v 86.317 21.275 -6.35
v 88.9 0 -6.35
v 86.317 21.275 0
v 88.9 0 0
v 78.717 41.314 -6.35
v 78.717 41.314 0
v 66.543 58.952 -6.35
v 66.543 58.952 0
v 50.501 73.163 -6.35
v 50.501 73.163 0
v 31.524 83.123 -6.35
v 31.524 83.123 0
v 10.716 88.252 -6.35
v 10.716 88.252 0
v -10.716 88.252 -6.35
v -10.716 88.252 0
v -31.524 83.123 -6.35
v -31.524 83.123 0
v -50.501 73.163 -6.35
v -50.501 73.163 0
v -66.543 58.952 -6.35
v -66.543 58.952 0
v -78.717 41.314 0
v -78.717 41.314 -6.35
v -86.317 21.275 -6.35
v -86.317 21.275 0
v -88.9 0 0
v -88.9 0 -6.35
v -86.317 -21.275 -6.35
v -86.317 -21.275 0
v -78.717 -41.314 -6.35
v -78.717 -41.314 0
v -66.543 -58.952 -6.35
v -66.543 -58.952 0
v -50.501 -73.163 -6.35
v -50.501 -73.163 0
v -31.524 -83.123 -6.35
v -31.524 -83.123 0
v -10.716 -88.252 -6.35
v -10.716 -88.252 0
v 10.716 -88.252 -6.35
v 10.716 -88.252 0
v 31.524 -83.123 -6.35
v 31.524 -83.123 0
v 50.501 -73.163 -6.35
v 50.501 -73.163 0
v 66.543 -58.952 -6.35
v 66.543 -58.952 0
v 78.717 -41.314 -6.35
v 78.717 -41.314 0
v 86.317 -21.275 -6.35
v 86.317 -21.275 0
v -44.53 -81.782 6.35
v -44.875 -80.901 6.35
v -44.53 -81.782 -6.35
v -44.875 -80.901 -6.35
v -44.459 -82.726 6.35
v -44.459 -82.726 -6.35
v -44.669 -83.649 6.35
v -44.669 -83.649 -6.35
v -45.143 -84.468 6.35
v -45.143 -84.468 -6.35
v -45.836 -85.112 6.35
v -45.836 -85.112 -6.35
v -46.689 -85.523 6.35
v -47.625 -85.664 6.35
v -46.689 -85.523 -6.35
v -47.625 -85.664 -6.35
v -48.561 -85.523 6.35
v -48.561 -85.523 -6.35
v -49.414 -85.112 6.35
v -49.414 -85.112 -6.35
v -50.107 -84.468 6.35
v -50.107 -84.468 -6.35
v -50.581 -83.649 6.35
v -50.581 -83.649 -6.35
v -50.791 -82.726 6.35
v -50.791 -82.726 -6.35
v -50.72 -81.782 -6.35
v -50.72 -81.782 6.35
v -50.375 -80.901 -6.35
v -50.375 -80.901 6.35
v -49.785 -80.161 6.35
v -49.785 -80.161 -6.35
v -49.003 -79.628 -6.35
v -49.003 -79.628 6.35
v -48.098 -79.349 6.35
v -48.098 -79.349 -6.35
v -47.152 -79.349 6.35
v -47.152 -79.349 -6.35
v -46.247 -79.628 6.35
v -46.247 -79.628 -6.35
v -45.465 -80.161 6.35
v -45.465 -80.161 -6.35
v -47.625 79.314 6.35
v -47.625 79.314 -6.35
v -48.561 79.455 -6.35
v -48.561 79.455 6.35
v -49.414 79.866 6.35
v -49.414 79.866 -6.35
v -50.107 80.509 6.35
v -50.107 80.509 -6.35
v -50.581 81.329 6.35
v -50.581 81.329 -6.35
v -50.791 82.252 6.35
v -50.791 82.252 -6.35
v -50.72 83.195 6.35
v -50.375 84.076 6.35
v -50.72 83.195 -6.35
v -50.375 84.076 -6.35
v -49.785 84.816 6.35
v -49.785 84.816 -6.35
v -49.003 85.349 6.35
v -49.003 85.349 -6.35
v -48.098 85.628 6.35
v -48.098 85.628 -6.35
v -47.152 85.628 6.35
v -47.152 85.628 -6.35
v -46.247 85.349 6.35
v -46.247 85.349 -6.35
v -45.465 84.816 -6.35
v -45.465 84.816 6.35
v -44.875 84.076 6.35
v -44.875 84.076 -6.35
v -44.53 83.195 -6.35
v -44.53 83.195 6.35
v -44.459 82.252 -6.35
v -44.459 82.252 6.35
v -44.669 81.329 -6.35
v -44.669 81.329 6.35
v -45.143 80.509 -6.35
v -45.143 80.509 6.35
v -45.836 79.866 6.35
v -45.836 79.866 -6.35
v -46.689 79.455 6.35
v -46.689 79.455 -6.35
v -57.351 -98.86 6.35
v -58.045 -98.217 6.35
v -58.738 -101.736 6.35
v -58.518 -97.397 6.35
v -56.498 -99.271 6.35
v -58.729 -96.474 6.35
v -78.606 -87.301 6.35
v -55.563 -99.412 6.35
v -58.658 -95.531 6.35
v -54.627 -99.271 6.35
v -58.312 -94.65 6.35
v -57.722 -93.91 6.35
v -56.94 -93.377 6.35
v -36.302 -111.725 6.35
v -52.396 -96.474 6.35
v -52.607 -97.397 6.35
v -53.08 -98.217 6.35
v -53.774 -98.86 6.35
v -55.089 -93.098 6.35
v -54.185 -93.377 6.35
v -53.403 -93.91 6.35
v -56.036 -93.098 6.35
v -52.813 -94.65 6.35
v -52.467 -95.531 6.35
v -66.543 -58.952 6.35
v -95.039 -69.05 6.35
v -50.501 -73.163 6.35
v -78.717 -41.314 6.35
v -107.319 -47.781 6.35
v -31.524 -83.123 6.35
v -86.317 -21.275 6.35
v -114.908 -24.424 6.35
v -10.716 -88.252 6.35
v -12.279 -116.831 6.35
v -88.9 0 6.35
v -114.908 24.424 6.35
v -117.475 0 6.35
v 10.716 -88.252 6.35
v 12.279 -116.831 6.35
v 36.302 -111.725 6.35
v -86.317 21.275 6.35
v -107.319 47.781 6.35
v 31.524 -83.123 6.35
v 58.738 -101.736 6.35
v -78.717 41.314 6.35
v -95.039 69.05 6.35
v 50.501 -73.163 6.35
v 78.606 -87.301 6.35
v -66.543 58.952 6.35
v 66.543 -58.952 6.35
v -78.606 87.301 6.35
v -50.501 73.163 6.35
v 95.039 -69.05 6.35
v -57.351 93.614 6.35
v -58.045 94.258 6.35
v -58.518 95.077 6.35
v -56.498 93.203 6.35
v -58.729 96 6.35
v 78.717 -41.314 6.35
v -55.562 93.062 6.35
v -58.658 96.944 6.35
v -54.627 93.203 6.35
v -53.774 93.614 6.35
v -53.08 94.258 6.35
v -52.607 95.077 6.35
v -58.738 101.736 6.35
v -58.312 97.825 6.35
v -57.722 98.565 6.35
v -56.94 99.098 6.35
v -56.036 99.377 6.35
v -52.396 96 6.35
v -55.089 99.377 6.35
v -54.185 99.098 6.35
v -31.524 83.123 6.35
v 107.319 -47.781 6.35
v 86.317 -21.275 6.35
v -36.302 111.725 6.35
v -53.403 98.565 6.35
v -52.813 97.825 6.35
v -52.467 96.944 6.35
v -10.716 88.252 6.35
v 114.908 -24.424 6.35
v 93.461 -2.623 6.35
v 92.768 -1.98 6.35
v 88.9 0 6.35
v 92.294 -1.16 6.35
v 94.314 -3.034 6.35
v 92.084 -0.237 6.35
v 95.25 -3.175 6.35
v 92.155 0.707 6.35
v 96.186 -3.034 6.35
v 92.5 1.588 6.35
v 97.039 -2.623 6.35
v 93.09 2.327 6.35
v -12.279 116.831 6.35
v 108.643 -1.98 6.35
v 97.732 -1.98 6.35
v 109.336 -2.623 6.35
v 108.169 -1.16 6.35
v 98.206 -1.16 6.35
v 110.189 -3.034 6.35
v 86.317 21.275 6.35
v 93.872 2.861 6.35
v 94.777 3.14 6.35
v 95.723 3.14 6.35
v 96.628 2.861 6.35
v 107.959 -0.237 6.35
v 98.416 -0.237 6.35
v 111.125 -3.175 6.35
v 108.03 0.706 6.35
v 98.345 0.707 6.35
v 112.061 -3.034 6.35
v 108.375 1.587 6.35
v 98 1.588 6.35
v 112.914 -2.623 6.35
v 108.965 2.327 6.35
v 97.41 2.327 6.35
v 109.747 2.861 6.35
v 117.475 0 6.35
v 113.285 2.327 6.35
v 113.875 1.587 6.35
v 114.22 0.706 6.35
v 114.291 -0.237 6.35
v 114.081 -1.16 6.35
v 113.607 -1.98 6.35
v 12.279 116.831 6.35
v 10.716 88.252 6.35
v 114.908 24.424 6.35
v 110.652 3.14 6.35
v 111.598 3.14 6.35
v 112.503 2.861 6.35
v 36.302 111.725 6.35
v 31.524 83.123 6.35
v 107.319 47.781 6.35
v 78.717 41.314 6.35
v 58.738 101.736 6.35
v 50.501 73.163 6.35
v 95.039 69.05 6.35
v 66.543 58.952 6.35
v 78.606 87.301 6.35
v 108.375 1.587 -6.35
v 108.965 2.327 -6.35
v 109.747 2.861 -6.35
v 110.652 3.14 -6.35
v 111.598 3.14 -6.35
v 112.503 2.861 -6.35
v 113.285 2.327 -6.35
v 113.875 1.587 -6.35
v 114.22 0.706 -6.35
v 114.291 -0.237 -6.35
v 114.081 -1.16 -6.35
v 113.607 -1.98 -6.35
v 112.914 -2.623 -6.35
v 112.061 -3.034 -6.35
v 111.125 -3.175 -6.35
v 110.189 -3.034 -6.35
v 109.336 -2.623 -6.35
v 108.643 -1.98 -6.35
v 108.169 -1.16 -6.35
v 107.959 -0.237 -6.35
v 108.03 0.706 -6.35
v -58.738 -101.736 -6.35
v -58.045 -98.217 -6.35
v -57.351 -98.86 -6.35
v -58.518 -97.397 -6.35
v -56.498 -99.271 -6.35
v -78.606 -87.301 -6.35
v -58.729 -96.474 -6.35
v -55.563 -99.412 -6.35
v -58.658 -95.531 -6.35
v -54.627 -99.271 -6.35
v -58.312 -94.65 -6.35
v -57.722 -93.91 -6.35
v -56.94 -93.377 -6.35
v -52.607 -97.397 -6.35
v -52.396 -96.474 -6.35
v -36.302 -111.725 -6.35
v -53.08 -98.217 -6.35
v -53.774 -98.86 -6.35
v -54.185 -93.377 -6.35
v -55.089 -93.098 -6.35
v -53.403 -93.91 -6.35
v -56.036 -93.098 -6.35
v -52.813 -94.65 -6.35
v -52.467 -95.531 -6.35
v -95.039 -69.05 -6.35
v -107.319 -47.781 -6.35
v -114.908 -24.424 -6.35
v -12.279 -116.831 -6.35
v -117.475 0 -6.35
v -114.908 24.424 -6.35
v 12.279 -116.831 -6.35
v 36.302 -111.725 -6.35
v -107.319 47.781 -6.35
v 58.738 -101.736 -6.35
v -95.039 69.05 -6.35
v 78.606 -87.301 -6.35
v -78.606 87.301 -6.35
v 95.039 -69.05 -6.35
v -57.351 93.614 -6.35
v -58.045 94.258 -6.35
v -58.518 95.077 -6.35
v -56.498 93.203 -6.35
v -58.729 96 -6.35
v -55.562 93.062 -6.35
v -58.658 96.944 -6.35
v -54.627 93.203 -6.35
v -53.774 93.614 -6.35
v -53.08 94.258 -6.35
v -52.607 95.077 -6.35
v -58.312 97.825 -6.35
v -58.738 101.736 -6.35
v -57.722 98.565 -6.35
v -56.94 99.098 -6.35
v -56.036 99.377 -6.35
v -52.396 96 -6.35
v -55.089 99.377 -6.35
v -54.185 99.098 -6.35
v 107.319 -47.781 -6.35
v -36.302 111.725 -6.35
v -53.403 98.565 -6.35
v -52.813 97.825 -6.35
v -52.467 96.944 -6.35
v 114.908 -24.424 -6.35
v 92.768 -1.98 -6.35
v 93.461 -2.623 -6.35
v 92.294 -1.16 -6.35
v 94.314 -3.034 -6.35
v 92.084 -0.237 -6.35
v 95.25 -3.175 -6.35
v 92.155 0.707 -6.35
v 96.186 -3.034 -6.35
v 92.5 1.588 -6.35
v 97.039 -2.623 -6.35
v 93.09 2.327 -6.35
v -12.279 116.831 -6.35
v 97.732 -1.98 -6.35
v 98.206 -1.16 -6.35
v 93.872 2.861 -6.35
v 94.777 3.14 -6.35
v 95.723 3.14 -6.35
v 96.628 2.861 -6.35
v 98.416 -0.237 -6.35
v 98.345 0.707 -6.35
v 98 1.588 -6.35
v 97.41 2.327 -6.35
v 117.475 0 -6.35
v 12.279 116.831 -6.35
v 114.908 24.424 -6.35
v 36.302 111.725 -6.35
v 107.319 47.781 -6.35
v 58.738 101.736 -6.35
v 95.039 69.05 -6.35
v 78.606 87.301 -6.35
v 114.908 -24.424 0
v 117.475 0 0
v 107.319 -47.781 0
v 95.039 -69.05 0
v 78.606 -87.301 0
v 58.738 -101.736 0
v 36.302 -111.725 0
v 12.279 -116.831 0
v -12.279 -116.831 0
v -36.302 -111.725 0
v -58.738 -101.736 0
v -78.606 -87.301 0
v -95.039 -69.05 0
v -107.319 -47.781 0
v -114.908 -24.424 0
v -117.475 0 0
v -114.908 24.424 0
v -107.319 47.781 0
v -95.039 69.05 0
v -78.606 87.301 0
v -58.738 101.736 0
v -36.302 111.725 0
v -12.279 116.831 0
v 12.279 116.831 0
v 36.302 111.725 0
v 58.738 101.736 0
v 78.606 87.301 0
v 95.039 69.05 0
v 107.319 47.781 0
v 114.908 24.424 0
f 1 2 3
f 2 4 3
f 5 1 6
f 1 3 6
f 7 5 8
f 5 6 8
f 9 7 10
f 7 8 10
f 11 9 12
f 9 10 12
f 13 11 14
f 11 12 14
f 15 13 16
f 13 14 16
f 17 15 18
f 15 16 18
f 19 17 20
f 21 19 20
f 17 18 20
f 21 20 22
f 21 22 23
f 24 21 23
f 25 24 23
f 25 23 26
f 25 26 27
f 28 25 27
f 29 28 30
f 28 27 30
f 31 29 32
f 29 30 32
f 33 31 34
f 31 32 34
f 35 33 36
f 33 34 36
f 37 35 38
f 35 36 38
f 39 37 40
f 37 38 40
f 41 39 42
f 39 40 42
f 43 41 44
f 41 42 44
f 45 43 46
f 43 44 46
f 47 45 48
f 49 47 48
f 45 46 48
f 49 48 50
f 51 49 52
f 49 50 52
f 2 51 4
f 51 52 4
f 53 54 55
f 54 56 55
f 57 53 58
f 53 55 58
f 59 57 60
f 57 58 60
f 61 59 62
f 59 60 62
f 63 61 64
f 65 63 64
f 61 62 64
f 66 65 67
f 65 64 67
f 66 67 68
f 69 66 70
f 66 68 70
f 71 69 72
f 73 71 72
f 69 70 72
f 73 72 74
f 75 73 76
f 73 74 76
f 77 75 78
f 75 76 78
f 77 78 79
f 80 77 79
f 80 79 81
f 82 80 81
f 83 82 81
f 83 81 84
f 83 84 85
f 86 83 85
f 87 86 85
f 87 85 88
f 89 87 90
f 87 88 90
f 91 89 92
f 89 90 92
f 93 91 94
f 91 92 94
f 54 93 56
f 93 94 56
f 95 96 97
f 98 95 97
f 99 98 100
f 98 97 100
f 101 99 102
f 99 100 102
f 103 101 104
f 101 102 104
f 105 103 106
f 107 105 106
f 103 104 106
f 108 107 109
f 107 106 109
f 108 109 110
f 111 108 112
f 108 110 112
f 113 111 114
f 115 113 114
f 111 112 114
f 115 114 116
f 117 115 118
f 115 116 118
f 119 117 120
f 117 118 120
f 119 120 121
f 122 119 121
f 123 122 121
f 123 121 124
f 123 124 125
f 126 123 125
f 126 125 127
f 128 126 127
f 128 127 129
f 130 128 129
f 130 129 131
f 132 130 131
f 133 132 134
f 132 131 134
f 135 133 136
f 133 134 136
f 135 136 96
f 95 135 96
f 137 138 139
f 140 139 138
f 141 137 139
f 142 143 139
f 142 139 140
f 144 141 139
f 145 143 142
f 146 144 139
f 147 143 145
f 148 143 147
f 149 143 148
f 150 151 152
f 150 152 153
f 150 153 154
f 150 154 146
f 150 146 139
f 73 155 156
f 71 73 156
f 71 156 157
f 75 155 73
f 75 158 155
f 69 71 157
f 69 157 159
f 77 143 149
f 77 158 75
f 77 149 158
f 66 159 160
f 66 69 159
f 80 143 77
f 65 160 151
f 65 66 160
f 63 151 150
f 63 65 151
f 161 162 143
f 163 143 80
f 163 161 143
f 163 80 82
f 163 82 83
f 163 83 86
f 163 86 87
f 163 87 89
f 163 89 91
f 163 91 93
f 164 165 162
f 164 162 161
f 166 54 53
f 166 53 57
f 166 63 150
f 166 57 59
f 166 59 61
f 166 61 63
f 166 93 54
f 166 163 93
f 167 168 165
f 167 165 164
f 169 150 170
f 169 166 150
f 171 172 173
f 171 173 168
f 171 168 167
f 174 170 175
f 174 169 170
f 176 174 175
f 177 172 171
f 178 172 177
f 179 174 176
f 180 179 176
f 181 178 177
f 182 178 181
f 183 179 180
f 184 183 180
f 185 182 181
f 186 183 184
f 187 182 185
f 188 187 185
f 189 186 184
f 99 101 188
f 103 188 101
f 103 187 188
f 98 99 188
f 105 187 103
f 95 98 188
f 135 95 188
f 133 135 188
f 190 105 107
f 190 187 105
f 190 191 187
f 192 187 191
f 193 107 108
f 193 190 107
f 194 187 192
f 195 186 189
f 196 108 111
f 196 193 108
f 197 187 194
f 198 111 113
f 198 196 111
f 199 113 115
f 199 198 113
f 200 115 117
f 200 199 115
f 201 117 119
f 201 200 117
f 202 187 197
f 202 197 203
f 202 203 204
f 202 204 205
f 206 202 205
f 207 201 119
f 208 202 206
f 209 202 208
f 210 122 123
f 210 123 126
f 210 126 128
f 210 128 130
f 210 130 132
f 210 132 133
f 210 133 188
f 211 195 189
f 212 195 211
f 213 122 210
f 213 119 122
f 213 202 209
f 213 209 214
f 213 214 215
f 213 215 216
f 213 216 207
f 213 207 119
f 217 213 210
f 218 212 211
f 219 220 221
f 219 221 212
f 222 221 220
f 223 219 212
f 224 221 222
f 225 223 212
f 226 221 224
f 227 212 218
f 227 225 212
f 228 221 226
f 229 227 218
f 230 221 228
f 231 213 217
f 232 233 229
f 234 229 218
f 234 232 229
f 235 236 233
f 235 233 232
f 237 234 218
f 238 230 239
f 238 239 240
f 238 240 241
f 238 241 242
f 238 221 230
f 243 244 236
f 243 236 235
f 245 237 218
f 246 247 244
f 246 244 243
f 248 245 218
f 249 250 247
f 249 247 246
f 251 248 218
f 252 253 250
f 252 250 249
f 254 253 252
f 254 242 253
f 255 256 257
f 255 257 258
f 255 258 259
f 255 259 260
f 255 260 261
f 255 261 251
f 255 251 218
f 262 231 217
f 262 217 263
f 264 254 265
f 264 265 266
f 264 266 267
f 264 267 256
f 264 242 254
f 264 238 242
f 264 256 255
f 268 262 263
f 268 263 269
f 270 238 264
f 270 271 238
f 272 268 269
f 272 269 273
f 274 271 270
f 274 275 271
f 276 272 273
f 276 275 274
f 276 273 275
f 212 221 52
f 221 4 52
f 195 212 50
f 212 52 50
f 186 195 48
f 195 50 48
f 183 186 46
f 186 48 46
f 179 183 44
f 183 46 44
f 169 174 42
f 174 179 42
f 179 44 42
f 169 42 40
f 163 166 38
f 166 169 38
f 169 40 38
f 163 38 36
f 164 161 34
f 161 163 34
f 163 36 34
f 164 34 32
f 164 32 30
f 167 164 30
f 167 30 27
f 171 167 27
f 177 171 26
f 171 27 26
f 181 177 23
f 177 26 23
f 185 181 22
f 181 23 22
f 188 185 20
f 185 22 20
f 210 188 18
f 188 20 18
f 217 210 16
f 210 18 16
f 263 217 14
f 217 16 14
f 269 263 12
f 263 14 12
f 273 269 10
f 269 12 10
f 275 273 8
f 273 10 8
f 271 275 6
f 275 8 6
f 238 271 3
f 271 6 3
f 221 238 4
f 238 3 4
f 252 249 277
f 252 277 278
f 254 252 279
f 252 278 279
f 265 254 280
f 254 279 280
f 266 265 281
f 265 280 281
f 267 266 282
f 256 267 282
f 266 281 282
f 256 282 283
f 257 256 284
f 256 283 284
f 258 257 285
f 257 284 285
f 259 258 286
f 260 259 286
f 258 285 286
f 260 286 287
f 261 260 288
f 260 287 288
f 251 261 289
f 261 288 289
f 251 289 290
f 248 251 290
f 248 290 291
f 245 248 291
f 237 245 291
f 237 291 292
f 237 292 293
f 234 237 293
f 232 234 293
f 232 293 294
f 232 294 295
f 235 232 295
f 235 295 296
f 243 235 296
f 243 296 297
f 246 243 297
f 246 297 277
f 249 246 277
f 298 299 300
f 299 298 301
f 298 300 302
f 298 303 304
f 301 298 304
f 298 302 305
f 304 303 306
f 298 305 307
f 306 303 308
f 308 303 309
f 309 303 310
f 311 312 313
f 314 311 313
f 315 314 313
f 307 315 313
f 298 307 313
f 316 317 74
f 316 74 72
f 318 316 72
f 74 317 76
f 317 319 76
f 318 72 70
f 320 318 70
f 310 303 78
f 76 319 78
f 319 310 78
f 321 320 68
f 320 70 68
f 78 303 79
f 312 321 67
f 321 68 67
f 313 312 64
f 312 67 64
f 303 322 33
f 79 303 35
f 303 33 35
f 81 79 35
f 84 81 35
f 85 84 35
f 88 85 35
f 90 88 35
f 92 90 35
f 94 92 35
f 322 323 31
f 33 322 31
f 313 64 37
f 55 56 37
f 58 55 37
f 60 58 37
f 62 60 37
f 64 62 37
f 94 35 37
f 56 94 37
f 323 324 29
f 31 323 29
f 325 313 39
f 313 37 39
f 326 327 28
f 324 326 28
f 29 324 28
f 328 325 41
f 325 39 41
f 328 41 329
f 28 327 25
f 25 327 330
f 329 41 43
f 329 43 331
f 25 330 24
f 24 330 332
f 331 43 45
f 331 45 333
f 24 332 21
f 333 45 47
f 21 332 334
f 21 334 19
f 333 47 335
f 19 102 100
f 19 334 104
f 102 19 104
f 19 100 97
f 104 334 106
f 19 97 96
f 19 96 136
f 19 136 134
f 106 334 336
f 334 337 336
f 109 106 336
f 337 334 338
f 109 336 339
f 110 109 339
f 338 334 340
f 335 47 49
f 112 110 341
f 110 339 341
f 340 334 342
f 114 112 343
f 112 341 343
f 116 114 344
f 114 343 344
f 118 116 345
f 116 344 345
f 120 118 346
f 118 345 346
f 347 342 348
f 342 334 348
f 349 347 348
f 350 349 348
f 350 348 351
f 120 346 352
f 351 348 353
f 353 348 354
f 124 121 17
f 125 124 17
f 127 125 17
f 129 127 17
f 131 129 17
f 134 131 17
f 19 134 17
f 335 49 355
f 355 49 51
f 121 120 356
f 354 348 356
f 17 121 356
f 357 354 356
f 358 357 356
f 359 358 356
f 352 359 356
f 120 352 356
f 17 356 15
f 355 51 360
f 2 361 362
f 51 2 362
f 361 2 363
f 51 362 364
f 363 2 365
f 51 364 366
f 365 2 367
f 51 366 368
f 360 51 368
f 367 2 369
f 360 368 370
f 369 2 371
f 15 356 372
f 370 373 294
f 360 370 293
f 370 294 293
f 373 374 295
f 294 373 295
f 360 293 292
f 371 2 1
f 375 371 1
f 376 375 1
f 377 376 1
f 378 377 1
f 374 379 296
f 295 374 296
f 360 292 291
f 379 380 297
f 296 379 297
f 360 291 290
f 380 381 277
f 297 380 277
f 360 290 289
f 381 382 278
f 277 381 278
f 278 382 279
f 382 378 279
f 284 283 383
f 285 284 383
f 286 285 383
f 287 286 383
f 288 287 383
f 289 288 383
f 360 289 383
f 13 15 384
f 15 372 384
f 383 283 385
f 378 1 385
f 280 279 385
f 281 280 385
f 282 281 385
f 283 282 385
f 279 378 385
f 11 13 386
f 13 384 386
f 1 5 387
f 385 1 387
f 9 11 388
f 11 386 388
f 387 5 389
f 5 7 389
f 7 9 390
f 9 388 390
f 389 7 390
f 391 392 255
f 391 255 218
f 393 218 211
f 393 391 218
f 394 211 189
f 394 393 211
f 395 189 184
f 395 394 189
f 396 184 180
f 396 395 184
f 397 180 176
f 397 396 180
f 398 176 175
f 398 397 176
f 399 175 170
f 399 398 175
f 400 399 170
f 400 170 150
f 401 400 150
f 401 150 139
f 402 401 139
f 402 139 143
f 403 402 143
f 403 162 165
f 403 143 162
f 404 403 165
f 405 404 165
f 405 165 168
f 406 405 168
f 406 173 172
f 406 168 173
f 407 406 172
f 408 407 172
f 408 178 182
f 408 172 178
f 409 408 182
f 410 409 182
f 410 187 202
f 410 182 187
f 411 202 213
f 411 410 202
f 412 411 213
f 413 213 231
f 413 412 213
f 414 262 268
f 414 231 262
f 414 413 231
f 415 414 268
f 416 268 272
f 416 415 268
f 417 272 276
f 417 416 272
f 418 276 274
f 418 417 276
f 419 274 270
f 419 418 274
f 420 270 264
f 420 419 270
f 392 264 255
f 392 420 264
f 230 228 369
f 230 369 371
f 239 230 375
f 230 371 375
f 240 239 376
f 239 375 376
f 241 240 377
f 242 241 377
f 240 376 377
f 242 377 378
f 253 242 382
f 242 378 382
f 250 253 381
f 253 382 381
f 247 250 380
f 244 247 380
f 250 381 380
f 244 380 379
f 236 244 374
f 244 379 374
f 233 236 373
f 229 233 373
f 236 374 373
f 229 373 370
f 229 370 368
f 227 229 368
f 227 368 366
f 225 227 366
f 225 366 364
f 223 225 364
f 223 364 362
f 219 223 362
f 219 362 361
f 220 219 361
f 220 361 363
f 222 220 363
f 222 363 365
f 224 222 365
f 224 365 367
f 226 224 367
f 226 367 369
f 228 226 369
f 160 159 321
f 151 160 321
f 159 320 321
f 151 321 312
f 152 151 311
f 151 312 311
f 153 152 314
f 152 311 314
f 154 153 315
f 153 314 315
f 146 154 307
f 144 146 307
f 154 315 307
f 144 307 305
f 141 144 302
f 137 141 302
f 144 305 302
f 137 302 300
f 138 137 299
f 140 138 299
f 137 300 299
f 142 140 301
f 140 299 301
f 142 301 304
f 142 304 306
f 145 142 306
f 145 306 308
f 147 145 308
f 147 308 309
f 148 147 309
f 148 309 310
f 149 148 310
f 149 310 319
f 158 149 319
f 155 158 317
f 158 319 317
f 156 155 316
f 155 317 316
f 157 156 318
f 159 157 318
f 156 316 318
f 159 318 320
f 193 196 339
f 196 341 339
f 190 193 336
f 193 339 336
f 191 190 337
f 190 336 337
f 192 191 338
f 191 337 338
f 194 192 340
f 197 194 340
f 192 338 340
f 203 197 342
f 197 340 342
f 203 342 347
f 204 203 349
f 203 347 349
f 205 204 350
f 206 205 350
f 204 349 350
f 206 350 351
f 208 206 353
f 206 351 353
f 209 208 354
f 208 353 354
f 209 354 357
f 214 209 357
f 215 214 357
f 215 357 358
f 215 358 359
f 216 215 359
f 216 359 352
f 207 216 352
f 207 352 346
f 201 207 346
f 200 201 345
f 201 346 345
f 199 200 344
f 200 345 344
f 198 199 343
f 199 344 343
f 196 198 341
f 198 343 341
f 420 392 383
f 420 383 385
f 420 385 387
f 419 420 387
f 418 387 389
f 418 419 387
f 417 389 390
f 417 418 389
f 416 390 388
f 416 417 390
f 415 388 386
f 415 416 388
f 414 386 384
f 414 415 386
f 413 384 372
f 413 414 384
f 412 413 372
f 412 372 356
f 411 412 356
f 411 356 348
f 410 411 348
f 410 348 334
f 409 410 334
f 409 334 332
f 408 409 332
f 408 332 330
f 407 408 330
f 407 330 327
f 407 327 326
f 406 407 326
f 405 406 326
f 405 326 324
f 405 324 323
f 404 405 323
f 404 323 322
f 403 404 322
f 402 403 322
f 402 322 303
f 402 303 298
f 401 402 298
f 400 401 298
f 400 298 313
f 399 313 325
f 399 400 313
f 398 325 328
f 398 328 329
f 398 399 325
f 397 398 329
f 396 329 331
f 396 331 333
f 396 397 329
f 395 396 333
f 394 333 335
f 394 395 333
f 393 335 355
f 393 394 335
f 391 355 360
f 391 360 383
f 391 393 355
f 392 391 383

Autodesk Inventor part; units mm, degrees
ref_plane "YZ Plane" through (0, 0, 0) normal (1, 0, 0) x (0, 1, 0)
ref_plane "XZ Plane" through (0, 0, 0) normal (0, 1, 0) x (-1, 0, 0)
ref_plane "XY Plane" through (0, 0, 0) normal (0, 0, 1) x (1, 0, 0)
sketch "Sketch1" plane through (0, 0, 0) normal (0, 0, 1) x (1, 0, 0)
  circle A0 centre (0, 0) radius 88.9
  circle A1 centre (0, 0) radius 117.475
  dimension "d0" = 177.8
  dimension "d2" = 28.575
extrude "Extrusion1" add sketch "Sketch1" along normal mid plane 12.7
sketch "Sketch2" plane through (0, 0, 6.35) normal (0, 0, 1) x (1, 0, 0)
  circle A0 centre (0, 0) radius 117.475 projected
  line L0 (0, 0) -> (-47.625, 82.4889) construction
  line L1 (-164.465, 0) -> (164.465, 0) projected
  line L2 (0, -164.465) -> (0, 164.465) projected
  line L3 (-47.625, 82.4889) -> (-55.5625, 96.2371) construction
  dimension "d5" = 30
  dimension "d16" = 95.25
  dimension "d17" = 15.875
hole "Hole1" at (-47.625, 82.4889, 6.35) at (-55.5625, 96.2371, 6.35) direction (0, 0, -1) diameter 6.35 end through all
pattern_circular "Circular Pattern1" count 3 over 360 about axis through (0, 0, -10) along (0, 0, 1) of "Hole1"
properties part number "ring_top" material "Aluminum-6061"
